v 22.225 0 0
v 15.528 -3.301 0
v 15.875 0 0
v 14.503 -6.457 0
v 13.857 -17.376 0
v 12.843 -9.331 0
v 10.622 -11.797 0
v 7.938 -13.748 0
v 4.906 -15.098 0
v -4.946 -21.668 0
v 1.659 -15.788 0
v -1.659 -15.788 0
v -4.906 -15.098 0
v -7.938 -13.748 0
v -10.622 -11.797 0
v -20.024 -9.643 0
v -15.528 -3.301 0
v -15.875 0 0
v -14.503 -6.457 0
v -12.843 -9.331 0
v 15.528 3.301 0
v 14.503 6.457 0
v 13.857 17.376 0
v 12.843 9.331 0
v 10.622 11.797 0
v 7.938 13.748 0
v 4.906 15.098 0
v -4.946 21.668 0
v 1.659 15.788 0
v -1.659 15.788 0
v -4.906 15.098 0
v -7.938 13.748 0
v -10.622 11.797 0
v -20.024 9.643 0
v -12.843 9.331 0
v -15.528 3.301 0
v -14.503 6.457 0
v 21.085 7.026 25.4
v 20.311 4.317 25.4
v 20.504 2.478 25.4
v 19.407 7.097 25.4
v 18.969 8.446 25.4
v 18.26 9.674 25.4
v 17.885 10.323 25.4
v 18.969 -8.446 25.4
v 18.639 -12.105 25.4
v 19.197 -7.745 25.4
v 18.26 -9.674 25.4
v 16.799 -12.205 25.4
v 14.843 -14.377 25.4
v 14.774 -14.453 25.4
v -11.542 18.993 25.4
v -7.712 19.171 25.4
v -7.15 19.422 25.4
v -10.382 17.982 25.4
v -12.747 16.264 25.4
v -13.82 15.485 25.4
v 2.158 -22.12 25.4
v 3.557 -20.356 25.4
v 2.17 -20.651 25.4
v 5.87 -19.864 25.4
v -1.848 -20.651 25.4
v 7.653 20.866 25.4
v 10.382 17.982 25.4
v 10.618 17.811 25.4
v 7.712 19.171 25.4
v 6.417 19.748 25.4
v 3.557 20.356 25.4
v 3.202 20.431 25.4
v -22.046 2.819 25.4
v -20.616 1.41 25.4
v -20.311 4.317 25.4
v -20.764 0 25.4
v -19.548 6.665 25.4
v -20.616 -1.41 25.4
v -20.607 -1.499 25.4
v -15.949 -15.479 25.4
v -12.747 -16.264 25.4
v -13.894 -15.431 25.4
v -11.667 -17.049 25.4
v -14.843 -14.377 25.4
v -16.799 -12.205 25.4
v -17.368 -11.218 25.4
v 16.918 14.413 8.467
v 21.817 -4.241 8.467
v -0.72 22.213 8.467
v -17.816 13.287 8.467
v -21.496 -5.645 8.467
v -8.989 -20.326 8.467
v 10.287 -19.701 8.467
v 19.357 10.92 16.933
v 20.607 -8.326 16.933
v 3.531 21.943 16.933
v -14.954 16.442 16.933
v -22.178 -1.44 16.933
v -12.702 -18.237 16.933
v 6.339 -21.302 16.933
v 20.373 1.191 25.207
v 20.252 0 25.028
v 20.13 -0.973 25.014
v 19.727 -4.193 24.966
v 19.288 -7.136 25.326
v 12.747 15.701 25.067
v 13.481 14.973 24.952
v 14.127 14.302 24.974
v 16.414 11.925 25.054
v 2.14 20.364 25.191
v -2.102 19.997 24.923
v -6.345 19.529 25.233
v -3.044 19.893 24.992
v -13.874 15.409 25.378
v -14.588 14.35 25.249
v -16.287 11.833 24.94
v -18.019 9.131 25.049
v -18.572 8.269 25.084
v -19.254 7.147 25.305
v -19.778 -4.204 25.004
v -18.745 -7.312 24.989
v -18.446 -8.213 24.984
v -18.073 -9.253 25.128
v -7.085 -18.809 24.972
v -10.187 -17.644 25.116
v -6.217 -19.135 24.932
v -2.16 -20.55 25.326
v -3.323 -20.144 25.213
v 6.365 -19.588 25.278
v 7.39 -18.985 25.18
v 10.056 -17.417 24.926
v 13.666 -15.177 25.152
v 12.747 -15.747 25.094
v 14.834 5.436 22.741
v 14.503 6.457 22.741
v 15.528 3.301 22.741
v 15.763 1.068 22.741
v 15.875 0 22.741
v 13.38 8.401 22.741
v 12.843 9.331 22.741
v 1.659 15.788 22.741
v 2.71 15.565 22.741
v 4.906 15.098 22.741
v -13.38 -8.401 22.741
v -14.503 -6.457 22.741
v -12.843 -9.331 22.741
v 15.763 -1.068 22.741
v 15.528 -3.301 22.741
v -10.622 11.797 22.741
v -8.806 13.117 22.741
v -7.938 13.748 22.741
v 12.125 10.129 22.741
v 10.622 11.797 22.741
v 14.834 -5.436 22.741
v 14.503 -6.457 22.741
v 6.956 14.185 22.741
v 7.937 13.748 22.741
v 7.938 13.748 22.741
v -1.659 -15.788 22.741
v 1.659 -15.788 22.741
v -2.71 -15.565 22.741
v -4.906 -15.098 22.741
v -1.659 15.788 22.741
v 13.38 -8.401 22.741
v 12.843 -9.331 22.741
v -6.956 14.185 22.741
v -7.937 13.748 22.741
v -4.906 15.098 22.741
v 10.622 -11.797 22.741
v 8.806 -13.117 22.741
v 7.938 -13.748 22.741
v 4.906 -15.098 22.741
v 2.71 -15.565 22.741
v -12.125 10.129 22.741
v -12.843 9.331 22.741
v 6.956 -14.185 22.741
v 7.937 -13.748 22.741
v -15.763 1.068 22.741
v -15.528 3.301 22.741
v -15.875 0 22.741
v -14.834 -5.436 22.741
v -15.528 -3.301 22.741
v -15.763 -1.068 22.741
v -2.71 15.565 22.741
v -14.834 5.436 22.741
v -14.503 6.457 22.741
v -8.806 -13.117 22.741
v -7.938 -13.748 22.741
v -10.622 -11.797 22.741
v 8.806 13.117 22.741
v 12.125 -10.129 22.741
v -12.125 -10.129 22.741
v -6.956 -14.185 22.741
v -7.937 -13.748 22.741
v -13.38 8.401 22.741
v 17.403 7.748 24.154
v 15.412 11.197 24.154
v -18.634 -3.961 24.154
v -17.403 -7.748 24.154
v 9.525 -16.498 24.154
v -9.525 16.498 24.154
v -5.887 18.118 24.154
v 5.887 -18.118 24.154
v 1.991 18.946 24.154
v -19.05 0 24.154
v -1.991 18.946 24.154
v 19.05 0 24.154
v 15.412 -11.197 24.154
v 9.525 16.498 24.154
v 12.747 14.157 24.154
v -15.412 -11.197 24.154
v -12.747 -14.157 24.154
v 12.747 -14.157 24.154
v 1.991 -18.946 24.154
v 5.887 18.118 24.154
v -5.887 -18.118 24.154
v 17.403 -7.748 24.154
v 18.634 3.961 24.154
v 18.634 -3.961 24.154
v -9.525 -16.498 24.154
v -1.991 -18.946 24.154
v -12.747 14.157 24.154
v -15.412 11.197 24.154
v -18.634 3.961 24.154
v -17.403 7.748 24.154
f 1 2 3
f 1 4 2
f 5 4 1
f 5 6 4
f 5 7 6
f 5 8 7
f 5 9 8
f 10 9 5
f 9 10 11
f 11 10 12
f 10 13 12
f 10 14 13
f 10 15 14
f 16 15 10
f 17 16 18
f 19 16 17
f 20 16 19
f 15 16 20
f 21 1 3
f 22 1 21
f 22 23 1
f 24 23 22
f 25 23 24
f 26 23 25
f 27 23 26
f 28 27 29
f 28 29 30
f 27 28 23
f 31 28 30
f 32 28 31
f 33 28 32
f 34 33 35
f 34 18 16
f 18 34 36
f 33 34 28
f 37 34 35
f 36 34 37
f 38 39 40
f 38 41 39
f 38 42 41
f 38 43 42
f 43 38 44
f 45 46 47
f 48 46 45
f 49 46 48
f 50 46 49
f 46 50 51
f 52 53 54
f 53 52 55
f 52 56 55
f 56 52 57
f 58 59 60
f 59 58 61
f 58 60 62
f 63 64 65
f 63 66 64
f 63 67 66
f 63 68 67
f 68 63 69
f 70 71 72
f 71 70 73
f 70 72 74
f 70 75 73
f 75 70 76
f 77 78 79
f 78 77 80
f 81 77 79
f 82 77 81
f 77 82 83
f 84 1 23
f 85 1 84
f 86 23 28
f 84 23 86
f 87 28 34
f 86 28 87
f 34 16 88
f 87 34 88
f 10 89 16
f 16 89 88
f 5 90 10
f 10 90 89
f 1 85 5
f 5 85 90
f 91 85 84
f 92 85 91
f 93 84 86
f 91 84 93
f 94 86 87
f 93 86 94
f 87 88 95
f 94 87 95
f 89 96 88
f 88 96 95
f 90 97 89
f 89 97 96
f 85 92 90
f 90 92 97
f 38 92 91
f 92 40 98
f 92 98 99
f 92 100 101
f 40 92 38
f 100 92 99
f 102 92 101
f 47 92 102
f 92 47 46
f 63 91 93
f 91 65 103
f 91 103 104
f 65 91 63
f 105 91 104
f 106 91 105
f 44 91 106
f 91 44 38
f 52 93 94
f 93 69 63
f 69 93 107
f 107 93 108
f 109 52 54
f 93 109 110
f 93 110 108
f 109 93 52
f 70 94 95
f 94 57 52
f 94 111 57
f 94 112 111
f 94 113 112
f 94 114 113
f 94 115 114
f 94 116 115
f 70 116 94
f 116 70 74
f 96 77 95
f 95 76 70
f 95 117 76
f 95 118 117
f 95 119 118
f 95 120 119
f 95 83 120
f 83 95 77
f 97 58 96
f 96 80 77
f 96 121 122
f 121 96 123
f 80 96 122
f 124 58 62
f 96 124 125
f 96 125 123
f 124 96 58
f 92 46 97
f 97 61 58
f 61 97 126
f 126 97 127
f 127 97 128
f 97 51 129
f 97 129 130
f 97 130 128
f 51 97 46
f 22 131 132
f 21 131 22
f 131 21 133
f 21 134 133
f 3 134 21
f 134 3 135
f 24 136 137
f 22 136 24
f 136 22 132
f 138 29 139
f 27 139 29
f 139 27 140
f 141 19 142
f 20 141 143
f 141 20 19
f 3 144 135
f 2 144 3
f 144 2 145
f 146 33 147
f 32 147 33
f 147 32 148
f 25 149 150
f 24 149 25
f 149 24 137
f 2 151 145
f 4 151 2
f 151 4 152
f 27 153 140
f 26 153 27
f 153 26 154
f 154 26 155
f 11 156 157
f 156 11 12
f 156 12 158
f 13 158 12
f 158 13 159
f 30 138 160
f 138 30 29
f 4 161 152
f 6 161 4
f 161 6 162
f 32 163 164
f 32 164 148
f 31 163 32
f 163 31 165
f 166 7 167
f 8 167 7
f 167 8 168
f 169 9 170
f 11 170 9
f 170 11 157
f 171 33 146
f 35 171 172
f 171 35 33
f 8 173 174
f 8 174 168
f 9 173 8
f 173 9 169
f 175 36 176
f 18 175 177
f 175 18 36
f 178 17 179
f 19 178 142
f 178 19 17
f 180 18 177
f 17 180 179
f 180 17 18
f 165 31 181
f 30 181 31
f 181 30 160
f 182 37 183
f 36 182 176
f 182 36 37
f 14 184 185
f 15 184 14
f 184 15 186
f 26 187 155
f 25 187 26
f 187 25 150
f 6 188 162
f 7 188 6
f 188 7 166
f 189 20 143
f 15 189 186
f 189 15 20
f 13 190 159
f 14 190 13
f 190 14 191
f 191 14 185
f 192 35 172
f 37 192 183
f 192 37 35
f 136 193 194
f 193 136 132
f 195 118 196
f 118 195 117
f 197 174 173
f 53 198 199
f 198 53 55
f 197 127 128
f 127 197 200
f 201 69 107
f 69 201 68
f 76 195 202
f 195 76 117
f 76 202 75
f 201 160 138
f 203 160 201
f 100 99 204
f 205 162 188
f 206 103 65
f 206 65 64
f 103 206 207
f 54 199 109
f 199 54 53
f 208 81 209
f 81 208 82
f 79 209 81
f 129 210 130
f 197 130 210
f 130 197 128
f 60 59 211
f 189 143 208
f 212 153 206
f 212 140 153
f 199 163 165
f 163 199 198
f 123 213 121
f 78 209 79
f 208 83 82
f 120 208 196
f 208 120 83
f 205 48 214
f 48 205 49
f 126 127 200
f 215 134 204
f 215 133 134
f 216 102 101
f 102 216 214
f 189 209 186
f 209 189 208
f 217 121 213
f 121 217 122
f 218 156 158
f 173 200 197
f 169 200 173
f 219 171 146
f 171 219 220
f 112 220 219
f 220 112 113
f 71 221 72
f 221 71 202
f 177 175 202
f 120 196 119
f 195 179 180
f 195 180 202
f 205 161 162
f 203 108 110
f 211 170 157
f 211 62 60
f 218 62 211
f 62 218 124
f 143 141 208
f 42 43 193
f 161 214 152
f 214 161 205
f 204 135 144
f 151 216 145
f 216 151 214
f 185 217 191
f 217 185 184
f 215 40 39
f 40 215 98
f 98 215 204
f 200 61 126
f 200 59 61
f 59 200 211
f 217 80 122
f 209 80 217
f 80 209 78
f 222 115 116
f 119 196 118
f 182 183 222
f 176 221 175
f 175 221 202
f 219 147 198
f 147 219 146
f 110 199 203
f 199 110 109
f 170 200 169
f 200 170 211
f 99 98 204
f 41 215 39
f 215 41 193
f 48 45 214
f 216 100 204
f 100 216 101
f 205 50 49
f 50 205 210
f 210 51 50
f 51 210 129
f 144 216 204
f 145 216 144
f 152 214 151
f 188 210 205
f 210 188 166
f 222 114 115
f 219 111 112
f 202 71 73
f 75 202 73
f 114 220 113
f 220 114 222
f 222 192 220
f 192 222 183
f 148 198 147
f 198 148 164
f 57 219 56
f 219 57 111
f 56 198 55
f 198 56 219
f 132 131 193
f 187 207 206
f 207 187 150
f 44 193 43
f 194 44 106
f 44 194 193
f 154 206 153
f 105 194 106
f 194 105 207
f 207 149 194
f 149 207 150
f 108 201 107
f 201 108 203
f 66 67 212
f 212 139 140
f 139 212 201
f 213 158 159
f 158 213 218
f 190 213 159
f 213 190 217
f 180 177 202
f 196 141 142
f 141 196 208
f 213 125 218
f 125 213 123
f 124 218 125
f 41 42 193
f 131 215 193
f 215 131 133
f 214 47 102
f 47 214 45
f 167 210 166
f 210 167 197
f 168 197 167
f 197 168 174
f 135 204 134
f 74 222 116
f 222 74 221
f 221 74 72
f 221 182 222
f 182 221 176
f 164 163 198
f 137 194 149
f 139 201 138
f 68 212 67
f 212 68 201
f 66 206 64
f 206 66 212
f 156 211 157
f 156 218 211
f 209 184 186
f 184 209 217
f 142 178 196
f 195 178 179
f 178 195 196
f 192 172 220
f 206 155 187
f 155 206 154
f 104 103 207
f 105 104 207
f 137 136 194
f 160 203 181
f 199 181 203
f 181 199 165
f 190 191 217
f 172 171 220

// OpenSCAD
//Title: Stone egg and sphere stand
//Author: Alex English - ProtoParadigm
//Date: 8/19/16
//License: Creative Commons - Share Alike - Attribution

//Notes: This is a stand for stone eggs and spheres. It's crazy simple, I'd love to see someone do something more artistic.

IN=25.4*1; //multiplication by 1 to prevent customizer from presenting this as a configurable value

//The diameter of the sphere, or the approximate diameter of the base of the egg (inches)
sphere_diameter = 3;
sd = IN*sphere_diameter;

//Inside diameter - how wide should the inside hole be (inches)?
inside_diameter = 1.25;
id=IN*inside_diameter;

//Outside Diameter - How much wider than the inside should the outside be (inches)?
outside_diameter = 0.5;
od=id+IN*outside_diameter;

//Height - How tall should the stand be (inches)?
height = 1;
h=IN*height;

difference()
{
    linear_extrude(height=h, twist=33) circle(d=od,$fn=7);
    translate([0, 0, -1]) cylinder(d=id, h=h+2);
    translate([0, 0, sd/2+h-h/4]) sphere(d=sd);
}
